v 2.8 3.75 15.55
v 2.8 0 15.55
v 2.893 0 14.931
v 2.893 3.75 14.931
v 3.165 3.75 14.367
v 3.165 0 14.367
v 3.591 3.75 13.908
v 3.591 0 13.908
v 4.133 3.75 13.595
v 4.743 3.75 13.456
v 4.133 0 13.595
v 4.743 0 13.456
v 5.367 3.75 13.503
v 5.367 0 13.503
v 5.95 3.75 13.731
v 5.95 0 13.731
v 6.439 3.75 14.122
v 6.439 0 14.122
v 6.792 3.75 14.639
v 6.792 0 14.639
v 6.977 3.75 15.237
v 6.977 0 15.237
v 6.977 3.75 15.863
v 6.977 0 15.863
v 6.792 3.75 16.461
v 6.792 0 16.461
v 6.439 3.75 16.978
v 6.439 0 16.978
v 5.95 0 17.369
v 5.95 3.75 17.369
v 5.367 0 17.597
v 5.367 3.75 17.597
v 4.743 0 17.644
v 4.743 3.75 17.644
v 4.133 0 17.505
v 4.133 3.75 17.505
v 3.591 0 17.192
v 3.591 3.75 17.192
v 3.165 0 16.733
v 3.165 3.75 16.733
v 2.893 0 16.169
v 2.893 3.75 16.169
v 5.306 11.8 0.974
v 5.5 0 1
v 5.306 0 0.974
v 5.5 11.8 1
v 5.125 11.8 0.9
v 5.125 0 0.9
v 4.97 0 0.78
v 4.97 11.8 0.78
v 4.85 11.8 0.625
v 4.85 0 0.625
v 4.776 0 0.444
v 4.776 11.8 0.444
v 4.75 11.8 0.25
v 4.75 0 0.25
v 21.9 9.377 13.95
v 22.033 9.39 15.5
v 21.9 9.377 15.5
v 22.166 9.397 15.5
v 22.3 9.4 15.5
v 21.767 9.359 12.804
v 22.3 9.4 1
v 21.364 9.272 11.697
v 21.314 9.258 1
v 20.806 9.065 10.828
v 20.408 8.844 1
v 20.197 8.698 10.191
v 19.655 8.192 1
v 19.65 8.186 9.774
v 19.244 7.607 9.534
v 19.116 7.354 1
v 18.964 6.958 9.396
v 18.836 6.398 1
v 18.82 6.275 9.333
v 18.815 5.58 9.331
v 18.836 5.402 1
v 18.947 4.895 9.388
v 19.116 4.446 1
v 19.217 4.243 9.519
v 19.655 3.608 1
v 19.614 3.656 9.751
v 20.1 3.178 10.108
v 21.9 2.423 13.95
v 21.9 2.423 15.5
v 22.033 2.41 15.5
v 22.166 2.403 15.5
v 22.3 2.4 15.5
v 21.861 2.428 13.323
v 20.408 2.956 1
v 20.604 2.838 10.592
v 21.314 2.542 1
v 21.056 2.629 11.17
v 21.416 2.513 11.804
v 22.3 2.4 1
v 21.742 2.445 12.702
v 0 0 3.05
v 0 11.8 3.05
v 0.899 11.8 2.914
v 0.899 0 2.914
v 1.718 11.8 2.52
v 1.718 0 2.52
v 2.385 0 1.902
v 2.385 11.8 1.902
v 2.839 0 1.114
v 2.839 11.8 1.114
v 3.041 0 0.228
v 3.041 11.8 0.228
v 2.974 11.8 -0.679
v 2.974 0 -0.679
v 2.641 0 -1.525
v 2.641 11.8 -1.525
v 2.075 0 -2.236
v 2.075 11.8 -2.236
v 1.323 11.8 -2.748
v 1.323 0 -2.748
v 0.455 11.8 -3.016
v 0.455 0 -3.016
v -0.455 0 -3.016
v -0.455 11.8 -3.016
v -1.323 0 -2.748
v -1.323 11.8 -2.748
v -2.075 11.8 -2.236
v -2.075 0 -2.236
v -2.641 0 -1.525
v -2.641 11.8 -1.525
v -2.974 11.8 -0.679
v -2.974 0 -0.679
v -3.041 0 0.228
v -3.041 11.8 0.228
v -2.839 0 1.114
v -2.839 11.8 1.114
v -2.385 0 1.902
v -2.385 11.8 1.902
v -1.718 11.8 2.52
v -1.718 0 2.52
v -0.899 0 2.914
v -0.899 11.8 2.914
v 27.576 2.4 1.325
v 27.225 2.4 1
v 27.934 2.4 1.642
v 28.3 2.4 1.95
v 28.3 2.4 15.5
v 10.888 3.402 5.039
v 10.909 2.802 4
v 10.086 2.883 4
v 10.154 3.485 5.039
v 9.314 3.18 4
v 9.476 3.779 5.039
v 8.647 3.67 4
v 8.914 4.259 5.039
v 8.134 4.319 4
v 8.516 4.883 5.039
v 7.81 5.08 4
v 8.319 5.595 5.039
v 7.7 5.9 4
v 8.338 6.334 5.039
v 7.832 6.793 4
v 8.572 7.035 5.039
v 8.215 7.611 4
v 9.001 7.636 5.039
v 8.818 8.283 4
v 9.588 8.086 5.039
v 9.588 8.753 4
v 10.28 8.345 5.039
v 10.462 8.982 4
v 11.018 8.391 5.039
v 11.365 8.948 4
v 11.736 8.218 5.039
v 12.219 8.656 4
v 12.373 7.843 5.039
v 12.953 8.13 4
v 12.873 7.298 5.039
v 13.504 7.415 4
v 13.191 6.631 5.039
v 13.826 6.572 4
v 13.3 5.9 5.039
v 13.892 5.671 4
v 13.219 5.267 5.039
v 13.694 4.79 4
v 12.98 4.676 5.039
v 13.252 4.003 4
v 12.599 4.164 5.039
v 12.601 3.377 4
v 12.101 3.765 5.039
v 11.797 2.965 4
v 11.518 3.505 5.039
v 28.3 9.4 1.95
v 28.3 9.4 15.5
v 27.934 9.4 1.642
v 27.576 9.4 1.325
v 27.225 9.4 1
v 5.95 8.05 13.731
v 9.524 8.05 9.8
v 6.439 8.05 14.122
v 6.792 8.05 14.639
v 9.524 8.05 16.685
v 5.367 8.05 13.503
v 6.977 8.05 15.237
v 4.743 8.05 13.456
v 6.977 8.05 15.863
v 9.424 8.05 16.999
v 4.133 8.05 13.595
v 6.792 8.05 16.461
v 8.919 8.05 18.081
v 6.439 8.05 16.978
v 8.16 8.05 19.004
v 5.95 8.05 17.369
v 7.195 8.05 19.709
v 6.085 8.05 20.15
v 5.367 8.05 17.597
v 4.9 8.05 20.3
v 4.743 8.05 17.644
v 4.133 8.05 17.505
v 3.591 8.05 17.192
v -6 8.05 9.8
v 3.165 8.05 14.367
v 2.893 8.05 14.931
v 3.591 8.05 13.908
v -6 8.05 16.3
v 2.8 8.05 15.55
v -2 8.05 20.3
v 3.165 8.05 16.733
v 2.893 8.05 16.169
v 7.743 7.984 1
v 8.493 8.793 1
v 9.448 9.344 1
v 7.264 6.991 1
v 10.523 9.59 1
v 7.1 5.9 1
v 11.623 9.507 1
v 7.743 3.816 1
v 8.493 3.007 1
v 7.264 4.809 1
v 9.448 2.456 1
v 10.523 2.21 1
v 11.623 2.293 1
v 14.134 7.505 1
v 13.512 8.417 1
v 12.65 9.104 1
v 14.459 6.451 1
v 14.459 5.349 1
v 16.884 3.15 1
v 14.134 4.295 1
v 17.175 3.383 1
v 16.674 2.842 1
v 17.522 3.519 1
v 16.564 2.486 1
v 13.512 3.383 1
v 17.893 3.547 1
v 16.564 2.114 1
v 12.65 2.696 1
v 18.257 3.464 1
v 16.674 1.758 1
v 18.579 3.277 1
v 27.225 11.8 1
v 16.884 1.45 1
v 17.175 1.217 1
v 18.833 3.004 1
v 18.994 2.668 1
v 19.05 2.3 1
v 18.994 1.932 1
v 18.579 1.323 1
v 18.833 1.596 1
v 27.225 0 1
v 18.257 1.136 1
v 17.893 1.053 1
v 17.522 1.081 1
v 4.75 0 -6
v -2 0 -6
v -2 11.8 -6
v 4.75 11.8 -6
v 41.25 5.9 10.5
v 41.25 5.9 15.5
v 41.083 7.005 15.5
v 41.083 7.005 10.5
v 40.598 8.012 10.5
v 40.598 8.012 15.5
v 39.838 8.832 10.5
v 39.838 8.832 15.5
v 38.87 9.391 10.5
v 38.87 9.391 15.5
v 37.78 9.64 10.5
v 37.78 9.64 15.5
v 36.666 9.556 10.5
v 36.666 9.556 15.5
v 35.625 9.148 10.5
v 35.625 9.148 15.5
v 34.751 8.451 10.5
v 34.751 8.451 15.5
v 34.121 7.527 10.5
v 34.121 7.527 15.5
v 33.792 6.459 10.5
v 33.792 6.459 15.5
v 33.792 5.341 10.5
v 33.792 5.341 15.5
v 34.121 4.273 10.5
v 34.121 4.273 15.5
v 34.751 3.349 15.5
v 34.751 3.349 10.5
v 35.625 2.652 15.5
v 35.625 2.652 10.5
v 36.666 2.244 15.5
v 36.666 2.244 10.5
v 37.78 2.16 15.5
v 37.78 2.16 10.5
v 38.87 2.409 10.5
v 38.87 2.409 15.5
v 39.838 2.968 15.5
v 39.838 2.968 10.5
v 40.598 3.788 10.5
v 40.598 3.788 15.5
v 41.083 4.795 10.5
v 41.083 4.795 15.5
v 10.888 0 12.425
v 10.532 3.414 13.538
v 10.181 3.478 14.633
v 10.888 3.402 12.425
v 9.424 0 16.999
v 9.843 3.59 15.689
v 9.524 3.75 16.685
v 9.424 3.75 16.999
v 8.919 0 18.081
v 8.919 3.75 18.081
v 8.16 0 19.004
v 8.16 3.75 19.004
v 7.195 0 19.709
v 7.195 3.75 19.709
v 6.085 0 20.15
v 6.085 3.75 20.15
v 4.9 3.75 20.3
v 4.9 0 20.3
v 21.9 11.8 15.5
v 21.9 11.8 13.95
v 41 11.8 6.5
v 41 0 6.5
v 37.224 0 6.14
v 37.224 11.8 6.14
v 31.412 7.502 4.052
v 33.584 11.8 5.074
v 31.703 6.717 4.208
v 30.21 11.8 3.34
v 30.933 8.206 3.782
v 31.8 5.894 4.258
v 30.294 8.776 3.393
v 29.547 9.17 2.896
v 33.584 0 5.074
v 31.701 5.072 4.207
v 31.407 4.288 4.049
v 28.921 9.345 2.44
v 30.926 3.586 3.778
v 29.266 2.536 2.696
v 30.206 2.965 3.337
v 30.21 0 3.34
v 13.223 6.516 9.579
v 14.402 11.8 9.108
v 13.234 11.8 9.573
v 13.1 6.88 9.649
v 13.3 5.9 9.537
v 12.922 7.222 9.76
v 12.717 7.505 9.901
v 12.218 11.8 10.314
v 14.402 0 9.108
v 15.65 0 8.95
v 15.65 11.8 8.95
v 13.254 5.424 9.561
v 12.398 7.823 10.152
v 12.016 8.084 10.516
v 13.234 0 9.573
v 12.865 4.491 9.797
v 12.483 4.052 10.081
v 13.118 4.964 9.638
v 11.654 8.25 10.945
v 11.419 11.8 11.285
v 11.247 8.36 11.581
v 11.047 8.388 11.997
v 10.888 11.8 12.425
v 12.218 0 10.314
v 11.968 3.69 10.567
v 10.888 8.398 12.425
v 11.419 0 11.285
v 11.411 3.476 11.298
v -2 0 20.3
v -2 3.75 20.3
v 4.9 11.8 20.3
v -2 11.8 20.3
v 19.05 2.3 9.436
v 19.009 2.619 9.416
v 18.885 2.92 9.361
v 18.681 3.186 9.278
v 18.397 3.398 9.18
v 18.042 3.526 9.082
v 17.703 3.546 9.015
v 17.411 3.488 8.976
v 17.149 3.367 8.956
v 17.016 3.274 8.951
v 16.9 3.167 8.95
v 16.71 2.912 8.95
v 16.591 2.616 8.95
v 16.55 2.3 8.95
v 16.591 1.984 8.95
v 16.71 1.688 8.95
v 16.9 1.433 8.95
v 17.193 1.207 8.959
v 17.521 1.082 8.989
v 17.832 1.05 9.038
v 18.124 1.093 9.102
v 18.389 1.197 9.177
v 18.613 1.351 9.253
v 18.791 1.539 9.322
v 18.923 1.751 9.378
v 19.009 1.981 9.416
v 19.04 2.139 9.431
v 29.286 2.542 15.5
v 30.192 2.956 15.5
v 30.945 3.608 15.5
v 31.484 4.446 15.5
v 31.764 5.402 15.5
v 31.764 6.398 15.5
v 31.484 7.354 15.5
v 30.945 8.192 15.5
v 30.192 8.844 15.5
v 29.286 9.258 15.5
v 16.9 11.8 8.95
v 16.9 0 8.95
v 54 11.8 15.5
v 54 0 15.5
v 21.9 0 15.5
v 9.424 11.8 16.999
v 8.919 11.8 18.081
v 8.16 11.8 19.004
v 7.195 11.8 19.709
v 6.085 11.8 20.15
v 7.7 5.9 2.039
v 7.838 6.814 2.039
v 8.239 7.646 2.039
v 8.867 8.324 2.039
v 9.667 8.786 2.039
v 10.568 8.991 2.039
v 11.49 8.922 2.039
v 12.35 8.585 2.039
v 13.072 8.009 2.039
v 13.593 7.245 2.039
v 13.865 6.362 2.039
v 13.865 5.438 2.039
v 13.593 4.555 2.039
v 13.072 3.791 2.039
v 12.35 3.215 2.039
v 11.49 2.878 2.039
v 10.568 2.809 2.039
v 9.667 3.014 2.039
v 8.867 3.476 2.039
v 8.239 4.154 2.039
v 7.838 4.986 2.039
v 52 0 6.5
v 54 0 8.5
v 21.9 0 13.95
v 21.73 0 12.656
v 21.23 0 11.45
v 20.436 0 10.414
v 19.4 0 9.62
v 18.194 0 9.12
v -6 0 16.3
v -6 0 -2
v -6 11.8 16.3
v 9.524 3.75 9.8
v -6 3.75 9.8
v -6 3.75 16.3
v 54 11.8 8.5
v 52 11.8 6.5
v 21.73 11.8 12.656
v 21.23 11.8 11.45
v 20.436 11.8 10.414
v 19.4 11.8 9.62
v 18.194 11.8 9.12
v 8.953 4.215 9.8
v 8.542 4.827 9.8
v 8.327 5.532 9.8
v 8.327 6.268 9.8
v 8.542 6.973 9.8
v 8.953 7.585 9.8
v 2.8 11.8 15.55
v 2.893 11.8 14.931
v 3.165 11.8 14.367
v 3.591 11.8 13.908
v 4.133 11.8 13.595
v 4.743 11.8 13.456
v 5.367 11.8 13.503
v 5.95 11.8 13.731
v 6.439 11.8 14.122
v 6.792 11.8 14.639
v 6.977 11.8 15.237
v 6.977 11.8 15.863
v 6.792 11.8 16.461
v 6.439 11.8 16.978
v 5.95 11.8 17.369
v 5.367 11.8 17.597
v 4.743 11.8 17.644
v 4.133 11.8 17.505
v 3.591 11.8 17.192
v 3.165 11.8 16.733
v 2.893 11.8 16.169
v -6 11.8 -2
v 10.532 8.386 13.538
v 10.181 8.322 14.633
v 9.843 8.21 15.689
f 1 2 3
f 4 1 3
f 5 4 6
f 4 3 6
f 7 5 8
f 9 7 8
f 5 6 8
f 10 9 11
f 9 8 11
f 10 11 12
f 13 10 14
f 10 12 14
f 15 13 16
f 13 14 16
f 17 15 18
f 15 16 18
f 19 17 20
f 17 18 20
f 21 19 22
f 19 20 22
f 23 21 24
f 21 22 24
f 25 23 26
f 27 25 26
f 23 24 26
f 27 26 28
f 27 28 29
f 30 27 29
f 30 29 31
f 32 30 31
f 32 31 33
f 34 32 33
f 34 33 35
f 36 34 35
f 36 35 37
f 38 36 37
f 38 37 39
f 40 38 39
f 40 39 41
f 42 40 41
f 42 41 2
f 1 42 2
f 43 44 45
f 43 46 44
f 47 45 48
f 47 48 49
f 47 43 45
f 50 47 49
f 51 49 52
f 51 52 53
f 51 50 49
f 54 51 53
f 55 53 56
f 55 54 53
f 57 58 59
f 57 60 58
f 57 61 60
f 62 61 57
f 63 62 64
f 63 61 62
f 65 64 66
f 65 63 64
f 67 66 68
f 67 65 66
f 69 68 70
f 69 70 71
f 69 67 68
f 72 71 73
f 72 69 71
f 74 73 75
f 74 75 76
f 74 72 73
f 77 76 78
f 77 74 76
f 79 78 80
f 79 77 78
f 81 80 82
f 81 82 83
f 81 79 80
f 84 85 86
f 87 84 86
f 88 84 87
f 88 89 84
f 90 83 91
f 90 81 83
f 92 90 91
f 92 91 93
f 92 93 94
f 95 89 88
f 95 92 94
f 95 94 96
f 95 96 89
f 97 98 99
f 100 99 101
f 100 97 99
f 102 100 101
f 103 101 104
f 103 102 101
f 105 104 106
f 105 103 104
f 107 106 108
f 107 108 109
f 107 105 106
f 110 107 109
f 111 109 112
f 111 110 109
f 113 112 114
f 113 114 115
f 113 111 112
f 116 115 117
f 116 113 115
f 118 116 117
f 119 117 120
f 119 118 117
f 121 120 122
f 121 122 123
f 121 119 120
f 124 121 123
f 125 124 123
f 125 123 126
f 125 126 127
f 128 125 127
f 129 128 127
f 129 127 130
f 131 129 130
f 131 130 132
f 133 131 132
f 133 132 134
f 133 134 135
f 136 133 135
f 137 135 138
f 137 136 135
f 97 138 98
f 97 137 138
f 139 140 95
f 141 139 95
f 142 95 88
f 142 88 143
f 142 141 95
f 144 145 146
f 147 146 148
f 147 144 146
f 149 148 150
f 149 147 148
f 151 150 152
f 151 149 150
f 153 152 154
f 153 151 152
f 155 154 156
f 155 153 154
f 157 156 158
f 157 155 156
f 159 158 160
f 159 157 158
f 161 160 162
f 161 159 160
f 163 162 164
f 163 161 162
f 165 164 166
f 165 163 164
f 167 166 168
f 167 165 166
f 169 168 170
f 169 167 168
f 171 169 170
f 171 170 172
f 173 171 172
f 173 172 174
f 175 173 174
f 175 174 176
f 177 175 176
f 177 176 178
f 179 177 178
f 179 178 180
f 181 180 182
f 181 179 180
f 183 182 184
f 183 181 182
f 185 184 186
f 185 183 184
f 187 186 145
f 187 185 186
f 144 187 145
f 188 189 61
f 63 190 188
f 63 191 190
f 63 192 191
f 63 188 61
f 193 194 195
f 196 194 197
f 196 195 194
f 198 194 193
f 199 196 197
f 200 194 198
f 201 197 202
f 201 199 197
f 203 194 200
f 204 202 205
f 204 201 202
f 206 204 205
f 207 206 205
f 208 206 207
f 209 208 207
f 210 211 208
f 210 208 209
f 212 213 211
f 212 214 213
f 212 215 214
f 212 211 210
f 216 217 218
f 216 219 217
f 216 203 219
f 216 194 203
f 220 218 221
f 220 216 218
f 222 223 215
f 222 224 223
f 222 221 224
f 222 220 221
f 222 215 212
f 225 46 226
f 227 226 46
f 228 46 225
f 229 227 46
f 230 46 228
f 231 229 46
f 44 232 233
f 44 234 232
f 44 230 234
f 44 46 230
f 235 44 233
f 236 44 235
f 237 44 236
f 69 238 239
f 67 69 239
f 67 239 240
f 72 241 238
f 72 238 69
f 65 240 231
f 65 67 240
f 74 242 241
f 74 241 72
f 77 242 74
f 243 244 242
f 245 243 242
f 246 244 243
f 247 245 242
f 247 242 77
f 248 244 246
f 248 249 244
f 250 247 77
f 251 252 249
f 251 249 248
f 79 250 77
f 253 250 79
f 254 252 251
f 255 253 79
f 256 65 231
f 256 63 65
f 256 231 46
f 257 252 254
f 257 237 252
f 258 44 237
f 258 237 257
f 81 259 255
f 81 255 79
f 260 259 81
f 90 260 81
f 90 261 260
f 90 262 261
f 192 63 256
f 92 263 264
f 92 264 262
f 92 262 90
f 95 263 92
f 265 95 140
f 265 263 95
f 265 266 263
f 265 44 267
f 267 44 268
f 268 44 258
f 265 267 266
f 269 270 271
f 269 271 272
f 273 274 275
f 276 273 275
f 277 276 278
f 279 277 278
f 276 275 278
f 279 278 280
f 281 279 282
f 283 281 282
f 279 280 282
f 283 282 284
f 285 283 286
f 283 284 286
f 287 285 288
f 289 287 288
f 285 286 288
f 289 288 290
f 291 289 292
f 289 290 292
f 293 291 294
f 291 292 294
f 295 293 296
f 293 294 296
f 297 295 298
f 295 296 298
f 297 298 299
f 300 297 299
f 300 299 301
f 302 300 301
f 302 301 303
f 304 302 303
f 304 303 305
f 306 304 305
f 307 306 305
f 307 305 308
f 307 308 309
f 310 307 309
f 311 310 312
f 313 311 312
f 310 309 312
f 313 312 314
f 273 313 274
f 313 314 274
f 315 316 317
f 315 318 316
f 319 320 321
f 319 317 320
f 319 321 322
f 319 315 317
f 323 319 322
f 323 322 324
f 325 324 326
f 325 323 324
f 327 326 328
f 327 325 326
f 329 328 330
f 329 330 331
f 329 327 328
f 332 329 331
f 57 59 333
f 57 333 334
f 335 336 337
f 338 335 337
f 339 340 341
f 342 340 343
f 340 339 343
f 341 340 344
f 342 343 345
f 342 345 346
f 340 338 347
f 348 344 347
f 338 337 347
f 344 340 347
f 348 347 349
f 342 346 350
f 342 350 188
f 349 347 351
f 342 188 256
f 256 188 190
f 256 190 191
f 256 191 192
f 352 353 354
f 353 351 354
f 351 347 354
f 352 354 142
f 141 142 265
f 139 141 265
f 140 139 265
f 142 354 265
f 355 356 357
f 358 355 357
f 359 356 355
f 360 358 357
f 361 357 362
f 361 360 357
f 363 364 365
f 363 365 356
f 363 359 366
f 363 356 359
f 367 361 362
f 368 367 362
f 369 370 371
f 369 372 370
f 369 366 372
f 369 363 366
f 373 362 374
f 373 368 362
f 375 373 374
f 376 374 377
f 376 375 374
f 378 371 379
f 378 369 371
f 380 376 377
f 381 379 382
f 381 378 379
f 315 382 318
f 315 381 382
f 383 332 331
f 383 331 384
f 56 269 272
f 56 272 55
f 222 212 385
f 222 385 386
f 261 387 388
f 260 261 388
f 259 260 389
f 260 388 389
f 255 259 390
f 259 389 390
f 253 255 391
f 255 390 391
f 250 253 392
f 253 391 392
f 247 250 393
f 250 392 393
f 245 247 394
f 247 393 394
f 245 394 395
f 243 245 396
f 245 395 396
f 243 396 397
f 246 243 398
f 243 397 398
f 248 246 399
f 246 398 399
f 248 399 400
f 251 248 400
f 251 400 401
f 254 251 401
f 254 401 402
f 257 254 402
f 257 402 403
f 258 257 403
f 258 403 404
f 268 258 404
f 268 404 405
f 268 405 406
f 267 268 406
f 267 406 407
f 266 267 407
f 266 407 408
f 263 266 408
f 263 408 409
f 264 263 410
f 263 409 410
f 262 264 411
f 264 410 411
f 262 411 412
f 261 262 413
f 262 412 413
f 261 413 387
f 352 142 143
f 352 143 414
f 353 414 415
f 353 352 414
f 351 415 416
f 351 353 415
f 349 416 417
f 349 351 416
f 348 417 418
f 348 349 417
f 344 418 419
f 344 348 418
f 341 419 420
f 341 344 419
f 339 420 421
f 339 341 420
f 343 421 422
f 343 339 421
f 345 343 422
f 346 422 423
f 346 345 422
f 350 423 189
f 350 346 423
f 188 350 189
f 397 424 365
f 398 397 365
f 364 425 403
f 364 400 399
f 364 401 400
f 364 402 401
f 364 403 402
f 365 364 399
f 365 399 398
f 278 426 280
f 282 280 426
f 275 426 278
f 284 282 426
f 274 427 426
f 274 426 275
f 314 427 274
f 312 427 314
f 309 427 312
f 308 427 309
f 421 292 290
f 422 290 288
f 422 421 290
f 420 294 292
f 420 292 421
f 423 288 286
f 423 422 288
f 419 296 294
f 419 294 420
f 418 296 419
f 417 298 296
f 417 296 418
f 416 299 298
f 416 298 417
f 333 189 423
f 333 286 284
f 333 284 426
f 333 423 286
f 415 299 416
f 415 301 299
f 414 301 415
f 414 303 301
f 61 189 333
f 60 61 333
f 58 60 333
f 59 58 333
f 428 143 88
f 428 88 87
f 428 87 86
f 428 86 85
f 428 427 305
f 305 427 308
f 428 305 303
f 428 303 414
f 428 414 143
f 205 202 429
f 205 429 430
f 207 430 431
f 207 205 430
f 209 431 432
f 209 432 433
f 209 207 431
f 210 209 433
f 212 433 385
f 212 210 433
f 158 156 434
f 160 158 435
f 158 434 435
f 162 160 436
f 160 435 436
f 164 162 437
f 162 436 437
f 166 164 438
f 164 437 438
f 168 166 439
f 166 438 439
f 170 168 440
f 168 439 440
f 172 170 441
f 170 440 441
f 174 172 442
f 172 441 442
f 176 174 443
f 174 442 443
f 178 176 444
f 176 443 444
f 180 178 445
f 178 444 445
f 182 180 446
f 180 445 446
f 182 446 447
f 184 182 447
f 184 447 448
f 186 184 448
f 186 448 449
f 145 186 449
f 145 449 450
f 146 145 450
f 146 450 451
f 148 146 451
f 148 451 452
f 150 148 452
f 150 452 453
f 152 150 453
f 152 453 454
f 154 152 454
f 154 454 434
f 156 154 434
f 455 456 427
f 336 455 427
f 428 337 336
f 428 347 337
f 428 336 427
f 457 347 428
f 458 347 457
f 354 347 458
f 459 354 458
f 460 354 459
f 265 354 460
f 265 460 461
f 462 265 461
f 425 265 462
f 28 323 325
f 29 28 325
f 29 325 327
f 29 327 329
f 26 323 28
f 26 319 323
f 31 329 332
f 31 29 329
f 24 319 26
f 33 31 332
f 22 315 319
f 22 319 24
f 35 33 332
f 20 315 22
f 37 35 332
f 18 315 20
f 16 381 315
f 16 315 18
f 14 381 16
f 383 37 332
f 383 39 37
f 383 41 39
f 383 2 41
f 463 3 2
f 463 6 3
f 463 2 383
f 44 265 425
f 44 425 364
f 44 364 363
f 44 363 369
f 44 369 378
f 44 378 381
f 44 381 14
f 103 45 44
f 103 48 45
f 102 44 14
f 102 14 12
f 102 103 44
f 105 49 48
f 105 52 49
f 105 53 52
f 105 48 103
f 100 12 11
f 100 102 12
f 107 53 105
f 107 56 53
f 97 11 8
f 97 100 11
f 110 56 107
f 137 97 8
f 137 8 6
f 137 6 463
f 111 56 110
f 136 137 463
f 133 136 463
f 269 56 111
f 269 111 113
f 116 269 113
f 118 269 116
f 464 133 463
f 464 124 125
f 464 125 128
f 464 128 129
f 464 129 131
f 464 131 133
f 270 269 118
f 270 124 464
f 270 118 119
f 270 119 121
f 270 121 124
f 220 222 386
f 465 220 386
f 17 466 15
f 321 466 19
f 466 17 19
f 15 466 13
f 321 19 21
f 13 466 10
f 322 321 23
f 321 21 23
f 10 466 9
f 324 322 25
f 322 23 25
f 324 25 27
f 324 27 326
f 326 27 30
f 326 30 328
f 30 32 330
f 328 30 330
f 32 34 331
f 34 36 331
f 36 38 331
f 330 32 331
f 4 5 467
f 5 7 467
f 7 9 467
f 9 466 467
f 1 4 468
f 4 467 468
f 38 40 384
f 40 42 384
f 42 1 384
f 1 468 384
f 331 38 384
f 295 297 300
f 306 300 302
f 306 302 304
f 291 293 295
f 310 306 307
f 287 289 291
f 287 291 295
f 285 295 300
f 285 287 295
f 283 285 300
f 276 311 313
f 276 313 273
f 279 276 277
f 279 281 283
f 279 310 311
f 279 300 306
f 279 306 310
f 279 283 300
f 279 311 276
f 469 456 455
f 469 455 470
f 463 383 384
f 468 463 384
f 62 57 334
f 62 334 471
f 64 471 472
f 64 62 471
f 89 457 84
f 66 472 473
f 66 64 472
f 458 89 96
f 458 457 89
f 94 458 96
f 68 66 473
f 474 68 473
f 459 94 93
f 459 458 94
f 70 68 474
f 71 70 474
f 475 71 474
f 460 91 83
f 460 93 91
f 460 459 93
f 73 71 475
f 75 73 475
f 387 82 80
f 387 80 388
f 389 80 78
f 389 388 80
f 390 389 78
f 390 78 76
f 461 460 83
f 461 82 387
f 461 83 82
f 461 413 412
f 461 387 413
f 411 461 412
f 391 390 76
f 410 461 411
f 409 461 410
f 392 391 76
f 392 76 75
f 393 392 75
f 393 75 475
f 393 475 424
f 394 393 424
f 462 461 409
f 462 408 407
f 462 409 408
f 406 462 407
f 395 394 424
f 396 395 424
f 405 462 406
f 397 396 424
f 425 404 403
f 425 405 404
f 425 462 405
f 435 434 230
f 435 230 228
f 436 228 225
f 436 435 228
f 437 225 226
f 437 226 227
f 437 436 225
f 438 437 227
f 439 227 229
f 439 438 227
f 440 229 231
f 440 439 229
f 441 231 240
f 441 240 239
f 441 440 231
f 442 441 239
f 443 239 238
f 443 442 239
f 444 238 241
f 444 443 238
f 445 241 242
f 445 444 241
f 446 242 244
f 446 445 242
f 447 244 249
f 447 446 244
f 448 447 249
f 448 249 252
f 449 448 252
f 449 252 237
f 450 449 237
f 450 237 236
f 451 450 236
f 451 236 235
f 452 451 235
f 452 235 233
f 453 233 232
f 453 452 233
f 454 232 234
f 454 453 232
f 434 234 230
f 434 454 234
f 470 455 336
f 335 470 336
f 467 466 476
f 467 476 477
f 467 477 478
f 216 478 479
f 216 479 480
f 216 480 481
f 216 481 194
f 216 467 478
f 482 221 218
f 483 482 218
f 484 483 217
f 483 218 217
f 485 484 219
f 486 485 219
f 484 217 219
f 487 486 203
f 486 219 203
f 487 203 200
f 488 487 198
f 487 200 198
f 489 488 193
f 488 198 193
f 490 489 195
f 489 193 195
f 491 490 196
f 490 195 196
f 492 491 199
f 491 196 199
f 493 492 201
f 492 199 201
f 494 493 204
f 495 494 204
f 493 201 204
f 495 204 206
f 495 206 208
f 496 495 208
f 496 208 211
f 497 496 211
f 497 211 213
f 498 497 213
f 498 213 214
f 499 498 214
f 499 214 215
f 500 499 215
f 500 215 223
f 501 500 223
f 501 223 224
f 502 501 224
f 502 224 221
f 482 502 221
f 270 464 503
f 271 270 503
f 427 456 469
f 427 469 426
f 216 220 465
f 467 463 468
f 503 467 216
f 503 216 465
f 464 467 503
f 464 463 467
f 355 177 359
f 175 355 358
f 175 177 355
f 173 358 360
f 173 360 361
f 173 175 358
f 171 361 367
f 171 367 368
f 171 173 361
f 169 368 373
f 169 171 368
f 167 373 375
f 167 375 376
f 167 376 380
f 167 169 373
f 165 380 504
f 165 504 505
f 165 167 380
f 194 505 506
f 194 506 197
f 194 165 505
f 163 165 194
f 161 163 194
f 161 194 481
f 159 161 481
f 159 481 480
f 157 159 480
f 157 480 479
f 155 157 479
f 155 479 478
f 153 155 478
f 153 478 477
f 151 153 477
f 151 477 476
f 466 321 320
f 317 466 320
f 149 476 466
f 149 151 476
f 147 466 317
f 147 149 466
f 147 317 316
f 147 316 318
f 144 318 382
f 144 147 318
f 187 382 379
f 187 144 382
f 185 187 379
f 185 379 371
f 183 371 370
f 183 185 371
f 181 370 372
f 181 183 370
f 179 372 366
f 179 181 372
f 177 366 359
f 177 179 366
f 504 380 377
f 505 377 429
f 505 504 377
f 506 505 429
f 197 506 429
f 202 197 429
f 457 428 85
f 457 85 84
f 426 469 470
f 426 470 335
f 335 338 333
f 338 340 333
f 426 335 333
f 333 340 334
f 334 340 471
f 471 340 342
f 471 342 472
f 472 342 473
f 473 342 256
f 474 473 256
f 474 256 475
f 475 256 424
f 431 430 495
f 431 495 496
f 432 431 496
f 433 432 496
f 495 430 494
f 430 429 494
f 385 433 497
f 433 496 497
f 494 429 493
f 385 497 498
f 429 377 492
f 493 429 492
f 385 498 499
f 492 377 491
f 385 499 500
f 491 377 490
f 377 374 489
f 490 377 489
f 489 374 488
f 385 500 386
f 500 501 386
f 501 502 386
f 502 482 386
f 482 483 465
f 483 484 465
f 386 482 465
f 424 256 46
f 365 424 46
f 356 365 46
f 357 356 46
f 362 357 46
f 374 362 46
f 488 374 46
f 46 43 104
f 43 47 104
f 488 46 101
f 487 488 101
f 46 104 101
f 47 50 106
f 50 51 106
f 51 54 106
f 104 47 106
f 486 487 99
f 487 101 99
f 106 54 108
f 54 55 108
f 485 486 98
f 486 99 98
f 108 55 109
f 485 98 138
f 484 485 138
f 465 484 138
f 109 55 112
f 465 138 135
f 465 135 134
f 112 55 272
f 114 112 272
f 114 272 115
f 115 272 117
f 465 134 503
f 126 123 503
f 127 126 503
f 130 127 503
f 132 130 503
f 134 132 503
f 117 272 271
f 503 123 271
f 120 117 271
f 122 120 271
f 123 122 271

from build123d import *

# Parameters (mm, degrees)
CROQUIS1_R                 = 1.5
CROQUIS1_R_2               = 3.05
SALIENTE_EXTRUIR1_DEPTH    = 11.8
TALADRO_ROSCADO_M51_D      = 4.2
CROQUIS2_W                 = 10.5
CROQUIS2_H                 = 4.3
CORTAR_EXTRUIR1_DEPTH      = 18
CORTAR_EXTRUIR6_DEPTH      = 58.488085722
CORTAR_EXTRUIR6_DEPTH_BACK = 58.488085722
CROQUIS13_R                = 2.5
CROQUIS27_R                = 3.1
CORTAR_EXTRUIR8_DEPTH      = 10
CROQUIS31_R                = 3.75
CORTAR_EXTRUIR9_DEPTH      = 5
CORTAR_EXTRUIR12_DEPTH     = 59.884038604
CHAFL_N2_SIZE              = 4
CHAFL_N3_SIZE              = 2
CORTAR_EXTRUIR17_DEPTH     = 62.212172011
CROQUIS46_W                = 28.049554897
CROQUIS46_H                = 7
CORTAR_EXTRUIR18_DEPTH     = 59.884038604
TALADRO_ROSCADO_M31_D      = 2.5
TALADRO_ROSCADO_M31_DEPTH  = 8.5
REDONDEO2_R                = 0.75
CHAFL_N5_SIZE              = 0.6
CHAFL_N5_SIZE2             = 1.039230485
CHAFL_N6_SIZE              = 4


with BuildPart() as part:
    # Croquis1 → Saliente-Extruir1 (new body)
    with BuildSketch(Plane(origin=(0, 0, 0), x_dir=(1, 0, 0), z_dir=(0, 1, 0))):
        with BuildLine():
            Line((15.65, -8.95), (16.9, -8.95))
            ThreePointArc((16.9, -8.95), (20.435533906, -10.414466094), (21.9, -13.95))
            Line((21.9, -13.95), (21.9, -15.5))
            Line((21.9, -15.5), (54, -15.5))
            Line((54, -15.5), (54, 6))
            Line((54, 6), (-6, 6))
            Line((-6, 6), (-6, -20.3))
            Line((-6, -20.3), (4.9, -20.3))
            ThreePointArc((4.9, -20.3), (7.700168487, -19.386868052), (9.423737687, -16.998550083))
            Line((9.423737687, -16.998550083), (10.888170856, -12.425210439))
            ThreePointArc((10.888170856, -12.425210439), (12.702454225, -9.911191525), (15.65, -8.95))
        make_face()
        with Locations((4.9, -15.55)):
            Circle(CROQUIS1_R, mode=Mode.SUBTRACT)
        Circle(CROQUIS1_R_2, mode=Mode.SUBTRACT)
    extrude(amount=SALIENTE_EXTRUIR1_DEPTH)

    # Taladro roscado M51 (through all)
    with Locations(Plane(origin=(0, 11.8, 0), x_dir=(1, 0, 0), z_dir=(0, 1, 0))):
        with Locations((4.9, -15.55)):
            Hole(TALADRO_ROSCADO_M51_D / 2)

    # Croquis2 → Cortar-Extruir1 (cut)
    with BuildSketch(Plane.ZY.offset(6)):
        with Locations((15.05, 5.9)):
            Rectangle(CROQUIS2_W, CROQUIS2_H)
    extrude(amount=-CORTAR_EXTRUIR1_DEPTH, mode=Mode.SUBTRACT)

    # Croquis13 → Cortar-Extruir6 (cut, two sides: drawn at the far end of the back side and taken through both)
    with BuildSketch(Plane.XY.offset(9.8).offset(-CORTAR_EXTRUIR6_DEPTH_BACK)):
        with Locations((10.8, 5.9)):
            Circle(CROQUIS13_R)
    extrude(amount=CORTAR_EXTRUIR6_DEPTH + CORTAR_EXTRUIR6_DEPTH_BACK, mode=Mode.SUBTRACT)

    # Croquis27 → Cortar-Extruir8 (cut)
    with BuildSketch(Plane(origin=(0, 0, -6), x_dir=(-1, 0, 0), z_dir=(0, 0, -1))):
        with Locations((-10.8, 5.9)):
            Circle(CROQUIS27_R)
    extrude(amount=-CORTAR_EXTRUIR8_DEPTH, mode=Mode.SUBTRACT)

    # Croquis31 → Cortar-Extruir9 (cut)
    with BuildSketch(Plane.XY.offset(15.5)):
        with Locations((37.5, 5.9)):
            Circle(CROQUIS31_R)
    extrude(amount=-CORTAR_EXTRUIR9_DEPTH, mode=Mode.SUBTRACT)

    # Croquis34 → Cortar-Extruir12 (cut, through all)
    with BuildSketch(Plane.XZ):
        with BuildLine():
            Line((54, 6.5), (41, 6.5))
            ThreePointArc((41, 6.5), (29.819660113, 3.083123952), (22.459503782, -6))
            Line((22.459503782, -6), (54, -6))
            Line((54, -6), (54, 6.5))
        make_face()
    extrude(amount=-CORTAR_EXTRUIR12_DEPTH, mode=Mode.SUBTRACT)

    # Chaflán2
    chafl_n2_edges = [part.edges().sort_by_distance(p)[0] for p in [
        (-6, 5.9, -6),
    ]]
    chamfer(chafl_n2_edges, length=CHAFL_N2_SIZE)

    # Chaflán3
    chafl_n3_edges = [part.edges().sort_by_distance(p)[0] for p in [
        (54, 5.9, 6.5),
    ]]
    chamfer(chafl_n3_edges, length=CHAFL_N3_SIZE)

    # Croquis35 → Cortar-Revolución1 (revolve, cut)
    with BuildSketch(Plane(origin=(0, 5.9, 0), x_dir=(-1, 0, 0), z_dir=(0, -1, 0))):
        Polygon((-13.9, -4), (-10.8, -9.369357503), (-10.8, -4), align=None)
    revolve(axis=Axis((10.8, 5.9, 4), (0, 0, -1)), mode=Mode.SUBTRACT)

    # Croquis45 → Cortar-Extruir17 (cut, through all)
    with BuildSketch(Plane(origin=(0, 0, -6), x_dir=(-1, 0, 0), z_dir=(0, 0, -1))):
        with BuildLine():
            Line((-22.3, 2.4), (-28.3, 2.4))
            ThreePointArc((-28.3, 2.4), (-31.8, 5.9), (-28.3, 9.4))
            Line((-28.3, 9.4), (-22.3, 9.4))
            ThreePointArc((-22.3, 9.4), (-18.8, 5.9), (-22.3, 2.4))
        make_face()
    extrude(amount=-CORTAR_EXTRUIR17_DEPTH, mode=Mode.SUBTRACT)

    # Croquis46 → Cortar-Extruir18 (cut, through all)
    with BuildSketch(Plane.XZ):
        with Locations((18.774777449, -2.5)):
            Rectangle(CROQUIS46_W, CROQUIS46_H)
    extrude(amount=-CORTAR_EXTRUIR18_DEPTH, mode=Mode.SUBTRACT)

    # Taladro roscado M31
    with Locations(Plane(origin=(0, 0, 1), x_dir=(-1, 0, 0), z_dir=(0, 0, -1))):
        with Locations((-17.8, 2.3)):
            Hole(TALADRO_ROSCADO_M31_D / 2, depth=TALADRO_ROSCADO_M31_DEPTH)

    # Redondeo2
    redondeo2_edges = [part.edges().sort_by_distance(p)[0] for p in [
        (4.75, 5.9, 1),
    ]]
    fillet(redondeo2_edges, radius=REDONDEO2_R)

    # Chaflán5
    chafl_n5_edges = [part.edges().sort_by_distance(p)[0] for p in [
        (13.9, 5.9, 1),
    ]]
    chafl_n5_side = [part.faces().sort_by_distance(p)[0] for p in [
        (15.082931418, 6.005477059, 1),
    ]]
    chamfer(chafl_n5_edges, length=CHAFL_N5_SIZE, length2=CHAFL_N5_SIZE2, reference=chafl_n5_side[0])

    # Chaflán6
    chafl_n6_edges = [part.edges().sort_by_distance(p)[0] for p in [
        (-6, 9.925, 20.3),
        (-6, 1.875, 20.3),
    ]]
    chamfer(chafl_n6_edges, length=CHAFL_N6_SIZE)


solid = part.part
